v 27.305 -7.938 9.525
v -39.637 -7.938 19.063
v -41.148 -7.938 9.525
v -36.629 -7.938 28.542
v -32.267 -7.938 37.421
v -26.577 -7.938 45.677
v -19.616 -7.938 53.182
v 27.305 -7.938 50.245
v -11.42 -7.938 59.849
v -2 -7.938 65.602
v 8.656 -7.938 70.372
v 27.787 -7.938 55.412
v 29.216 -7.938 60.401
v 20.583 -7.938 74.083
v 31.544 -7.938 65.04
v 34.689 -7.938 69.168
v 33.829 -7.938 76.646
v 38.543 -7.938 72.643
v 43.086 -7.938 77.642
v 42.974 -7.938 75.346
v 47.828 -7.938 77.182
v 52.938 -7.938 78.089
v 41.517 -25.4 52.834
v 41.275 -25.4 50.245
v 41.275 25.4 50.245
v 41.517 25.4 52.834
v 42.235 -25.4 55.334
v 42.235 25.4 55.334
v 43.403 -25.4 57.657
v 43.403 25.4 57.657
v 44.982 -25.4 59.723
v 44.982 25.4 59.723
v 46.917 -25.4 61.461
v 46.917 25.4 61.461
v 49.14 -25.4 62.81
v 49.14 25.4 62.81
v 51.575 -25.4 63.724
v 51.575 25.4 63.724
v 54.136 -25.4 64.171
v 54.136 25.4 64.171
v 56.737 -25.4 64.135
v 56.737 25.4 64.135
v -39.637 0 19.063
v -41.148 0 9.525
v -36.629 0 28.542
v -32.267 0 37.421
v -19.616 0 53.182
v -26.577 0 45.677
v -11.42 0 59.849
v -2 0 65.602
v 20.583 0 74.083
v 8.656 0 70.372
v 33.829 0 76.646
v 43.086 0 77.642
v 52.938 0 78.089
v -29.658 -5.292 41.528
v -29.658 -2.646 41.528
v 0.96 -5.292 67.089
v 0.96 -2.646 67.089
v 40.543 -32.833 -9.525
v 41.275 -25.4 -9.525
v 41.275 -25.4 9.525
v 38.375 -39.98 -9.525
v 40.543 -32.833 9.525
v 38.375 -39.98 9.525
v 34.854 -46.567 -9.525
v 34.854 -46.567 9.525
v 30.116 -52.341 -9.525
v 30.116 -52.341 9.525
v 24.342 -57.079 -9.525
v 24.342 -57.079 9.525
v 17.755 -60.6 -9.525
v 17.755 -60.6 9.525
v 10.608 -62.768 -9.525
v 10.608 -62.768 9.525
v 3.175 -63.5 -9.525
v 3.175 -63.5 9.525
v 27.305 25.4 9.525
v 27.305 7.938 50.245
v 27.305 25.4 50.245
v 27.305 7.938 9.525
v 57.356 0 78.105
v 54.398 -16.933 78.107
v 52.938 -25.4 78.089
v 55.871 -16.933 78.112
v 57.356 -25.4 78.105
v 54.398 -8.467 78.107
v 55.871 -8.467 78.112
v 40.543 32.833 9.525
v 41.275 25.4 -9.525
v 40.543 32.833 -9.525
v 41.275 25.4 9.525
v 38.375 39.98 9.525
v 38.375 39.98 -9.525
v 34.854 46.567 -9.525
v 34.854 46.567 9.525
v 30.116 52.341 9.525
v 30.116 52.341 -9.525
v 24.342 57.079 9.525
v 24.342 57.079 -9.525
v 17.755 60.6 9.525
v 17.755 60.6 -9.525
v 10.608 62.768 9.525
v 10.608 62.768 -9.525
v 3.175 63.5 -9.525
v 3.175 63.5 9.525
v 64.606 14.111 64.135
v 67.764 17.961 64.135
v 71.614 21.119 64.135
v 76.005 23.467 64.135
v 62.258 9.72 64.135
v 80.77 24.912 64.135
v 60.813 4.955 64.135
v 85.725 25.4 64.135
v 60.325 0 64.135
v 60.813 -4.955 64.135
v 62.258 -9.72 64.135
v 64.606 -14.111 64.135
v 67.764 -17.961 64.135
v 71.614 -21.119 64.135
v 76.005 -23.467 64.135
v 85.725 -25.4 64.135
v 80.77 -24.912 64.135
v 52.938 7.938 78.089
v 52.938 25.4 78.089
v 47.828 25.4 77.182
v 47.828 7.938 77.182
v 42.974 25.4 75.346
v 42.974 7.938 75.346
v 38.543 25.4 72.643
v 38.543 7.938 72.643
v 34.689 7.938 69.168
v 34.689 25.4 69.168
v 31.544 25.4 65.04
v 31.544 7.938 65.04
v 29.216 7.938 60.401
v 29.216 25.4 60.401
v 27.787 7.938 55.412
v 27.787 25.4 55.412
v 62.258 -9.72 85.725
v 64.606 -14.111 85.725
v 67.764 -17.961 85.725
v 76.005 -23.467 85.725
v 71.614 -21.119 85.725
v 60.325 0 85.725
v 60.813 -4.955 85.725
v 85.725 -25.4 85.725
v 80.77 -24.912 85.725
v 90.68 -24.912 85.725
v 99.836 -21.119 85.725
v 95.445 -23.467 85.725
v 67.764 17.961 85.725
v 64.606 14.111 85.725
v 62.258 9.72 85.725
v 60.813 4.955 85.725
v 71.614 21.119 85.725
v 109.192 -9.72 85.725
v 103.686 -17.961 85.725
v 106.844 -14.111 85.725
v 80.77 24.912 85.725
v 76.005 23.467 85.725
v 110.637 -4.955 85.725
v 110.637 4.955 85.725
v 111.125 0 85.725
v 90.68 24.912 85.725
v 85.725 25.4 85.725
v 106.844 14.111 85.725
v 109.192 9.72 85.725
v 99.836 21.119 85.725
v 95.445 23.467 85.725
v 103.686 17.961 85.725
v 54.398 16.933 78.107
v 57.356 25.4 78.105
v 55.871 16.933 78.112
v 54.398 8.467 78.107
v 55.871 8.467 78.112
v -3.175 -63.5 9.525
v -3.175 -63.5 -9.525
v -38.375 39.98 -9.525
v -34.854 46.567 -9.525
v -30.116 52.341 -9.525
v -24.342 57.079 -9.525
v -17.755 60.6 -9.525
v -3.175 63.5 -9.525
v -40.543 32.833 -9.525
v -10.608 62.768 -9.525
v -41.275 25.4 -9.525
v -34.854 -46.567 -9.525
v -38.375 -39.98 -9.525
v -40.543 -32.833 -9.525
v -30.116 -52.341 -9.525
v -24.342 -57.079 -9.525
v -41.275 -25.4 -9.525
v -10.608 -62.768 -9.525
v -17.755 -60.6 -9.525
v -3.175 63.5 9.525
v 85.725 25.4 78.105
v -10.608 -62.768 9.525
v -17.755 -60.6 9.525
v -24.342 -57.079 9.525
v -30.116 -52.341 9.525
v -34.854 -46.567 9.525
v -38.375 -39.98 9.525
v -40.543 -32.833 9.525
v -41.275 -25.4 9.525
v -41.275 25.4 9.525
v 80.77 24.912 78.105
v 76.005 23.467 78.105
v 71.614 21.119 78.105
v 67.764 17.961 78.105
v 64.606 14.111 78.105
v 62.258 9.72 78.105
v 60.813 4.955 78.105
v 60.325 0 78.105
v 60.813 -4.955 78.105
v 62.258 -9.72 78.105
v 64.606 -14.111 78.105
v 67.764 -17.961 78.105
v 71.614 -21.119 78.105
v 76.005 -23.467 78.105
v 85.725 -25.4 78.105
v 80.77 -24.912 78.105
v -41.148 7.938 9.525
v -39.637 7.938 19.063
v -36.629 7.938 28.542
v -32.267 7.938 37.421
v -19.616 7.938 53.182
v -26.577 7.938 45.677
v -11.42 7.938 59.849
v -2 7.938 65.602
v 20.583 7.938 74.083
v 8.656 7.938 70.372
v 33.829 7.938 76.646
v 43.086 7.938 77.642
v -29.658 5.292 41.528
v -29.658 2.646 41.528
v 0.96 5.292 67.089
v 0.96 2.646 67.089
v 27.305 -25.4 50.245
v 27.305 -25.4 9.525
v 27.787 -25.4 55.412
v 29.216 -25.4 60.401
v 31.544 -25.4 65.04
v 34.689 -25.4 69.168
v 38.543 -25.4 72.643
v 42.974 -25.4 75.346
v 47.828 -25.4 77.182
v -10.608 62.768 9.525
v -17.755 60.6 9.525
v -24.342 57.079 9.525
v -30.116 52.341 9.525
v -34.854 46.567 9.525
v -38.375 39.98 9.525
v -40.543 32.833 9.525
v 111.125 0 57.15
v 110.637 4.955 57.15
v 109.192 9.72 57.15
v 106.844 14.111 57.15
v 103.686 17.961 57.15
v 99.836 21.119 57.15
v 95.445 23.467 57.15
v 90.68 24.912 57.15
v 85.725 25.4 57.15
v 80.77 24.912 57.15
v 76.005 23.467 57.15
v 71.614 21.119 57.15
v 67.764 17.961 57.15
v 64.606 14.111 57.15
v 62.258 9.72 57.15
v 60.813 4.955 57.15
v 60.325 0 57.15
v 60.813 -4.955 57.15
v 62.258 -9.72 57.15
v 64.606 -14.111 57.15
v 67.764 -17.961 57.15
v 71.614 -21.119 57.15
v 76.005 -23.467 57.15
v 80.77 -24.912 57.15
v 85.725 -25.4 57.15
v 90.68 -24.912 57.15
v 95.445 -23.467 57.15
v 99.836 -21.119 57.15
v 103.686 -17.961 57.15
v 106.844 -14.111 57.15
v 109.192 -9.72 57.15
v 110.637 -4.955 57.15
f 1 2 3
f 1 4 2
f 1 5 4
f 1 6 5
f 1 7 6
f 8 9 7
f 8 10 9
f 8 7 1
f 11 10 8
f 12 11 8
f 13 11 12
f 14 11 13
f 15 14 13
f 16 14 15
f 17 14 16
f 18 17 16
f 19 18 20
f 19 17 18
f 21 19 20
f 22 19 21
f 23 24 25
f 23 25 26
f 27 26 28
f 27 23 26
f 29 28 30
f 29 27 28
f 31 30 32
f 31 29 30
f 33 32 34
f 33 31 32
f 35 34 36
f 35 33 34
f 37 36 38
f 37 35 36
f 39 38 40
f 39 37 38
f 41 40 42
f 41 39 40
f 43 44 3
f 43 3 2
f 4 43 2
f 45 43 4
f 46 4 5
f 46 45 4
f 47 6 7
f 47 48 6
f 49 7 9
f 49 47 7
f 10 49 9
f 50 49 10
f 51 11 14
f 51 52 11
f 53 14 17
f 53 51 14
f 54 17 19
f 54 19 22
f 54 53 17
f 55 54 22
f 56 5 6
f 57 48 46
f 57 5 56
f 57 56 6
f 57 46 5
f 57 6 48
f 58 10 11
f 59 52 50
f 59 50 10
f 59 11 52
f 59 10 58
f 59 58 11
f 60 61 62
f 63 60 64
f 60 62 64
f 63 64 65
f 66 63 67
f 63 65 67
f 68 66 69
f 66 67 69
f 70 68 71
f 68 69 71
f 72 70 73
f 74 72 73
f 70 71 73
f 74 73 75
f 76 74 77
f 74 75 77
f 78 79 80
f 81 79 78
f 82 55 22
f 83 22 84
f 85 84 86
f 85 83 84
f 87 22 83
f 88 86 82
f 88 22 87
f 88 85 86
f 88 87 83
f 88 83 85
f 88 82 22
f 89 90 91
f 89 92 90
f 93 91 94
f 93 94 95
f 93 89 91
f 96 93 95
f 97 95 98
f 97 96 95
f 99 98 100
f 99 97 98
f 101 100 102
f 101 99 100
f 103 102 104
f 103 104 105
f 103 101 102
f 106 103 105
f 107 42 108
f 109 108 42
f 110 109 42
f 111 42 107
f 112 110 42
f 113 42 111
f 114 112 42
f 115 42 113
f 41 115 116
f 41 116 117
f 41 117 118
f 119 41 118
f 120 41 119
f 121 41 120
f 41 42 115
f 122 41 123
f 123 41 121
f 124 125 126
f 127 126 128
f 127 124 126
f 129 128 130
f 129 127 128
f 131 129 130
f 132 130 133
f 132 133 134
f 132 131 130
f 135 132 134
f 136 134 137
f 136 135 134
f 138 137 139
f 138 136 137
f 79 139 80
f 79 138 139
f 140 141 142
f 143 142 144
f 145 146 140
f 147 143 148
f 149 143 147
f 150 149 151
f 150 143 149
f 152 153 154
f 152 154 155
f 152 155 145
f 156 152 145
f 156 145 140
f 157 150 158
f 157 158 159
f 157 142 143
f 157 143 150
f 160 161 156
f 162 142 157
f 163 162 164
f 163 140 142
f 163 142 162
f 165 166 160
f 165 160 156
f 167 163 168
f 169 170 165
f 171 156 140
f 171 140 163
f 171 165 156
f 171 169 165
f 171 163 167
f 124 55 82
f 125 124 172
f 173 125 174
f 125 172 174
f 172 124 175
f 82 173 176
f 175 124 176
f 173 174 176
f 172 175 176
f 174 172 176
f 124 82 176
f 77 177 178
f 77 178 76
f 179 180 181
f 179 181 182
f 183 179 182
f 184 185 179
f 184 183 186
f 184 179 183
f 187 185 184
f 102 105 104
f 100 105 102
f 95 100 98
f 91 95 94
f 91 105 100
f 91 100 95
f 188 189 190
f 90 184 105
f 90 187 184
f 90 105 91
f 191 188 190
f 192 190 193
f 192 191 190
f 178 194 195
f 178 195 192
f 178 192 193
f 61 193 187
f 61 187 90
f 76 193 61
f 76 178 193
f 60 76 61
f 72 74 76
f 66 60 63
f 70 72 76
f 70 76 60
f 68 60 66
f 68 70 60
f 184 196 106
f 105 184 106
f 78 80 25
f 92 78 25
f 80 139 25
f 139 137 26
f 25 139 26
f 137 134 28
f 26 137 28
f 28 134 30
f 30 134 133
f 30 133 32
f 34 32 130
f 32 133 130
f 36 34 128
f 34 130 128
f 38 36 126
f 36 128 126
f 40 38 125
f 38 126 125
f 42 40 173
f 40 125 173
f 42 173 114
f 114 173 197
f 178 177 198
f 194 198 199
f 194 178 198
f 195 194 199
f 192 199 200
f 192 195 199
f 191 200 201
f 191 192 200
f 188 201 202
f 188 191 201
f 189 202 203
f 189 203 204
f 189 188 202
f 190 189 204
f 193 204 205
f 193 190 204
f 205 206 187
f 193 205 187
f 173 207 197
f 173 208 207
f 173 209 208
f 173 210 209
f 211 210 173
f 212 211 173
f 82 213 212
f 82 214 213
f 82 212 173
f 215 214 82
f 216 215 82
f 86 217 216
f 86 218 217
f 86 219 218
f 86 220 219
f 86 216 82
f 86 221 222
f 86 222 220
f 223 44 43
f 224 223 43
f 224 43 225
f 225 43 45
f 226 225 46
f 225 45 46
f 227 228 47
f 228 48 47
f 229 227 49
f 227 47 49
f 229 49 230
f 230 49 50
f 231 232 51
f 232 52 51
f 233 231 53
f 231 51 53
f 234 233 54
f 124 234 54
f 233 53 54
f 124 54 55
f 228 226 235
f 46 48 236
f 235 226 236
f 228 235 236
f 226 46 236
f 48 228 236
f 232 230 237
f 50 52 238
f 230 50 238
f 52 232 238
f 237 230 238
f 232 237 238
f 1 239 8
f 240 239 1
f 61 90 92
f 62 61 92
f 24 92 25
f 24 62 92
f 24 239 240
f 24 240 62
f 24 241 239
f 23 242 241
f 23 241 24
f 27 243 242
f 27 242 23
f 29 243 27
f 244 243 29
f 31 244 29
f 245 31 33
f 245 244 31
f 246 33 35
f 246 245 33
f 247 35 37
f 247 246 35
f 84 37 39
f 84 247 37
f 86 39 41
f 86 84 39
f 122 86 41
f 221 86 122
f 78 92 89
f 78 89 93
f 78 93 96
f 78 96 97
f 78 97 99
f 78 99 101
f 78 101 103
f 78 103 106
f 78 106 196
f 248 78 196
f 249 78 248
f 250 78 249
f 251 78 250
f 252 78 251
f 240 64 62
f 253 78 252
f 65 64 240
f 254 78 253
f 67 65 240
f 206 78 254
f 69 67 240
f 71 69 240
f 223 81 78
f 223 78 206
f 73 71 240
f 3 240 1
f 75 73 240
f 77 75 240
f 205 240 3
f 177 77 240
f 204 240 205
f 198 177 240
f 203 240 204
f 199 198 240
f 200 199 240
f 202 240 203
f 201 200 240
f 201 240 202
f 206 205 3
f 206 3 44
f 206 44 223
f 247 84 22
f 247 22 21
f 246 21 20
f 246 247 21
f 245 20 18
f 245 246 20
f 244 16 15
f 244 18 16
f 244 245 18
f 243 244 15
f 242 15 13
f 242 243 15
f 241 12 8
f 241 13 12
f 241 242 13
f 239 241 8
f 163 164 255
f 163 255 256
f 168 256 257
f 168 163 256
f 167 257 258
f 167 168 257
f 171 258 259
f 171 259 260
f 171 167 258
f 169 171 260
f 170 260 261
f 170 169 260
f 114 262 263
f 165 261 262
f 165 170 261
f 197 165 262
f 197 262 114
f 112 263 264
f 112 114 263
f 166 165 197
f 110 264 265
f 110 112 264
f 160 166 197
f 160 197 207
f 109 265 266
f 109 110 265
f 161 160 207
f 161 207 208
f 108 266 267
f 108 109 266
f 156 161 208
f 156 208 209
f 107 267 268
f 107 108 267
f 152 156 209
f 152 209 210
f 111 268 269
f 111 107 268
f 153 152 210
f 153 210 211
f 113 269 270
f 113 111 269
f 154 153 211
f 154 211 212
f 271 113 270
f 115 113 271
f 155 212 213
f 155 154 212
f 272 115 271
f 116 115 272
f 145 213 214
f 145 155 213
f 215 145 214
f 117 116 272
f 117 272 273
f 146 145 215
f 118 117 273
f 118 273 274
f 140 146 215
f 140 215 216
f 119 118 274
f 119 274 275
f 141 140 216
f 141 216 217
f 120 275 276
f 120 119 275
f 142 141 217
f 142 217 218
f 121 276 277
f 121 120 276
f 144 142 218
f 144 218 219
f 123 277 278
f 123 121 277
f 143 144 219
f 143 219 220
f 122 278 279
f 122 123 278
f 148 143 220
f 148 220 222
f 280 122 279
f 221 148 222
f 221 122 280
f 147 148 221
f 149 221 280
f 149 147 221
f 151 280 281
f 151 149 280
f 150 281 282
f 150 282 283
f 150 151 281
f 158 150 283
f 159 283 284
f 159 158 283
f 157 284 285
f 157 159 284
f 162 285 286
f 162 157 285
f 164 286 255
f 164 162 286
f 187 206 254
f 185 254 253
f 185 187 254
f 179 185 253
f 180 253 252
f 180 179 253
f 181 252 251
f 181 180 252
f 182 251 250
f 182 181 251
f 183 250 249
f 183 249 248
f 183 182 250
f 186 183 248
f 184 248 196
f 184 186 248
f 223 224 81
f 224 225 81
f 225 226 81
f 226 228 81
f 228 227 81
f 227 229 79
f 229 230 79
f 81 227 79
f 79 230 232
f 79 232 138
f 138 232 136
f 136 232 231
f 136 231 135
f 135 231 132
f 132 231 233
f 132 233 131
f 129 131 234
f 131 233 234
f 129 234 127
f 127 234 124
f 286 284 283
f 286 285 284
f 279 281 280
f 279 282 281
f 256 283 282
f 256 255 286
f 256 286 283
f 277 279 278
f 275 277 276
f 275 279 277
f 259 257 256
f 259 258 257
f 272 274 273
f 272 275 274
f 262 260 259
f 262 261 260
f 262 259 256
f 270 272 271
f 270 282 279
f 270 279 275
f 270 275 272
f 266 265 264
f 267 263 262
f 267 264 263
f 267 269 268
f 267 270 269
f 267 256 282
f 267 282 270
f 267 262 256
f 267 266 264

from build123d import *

# Parameters (mm, degrees)
F1_DEPTH = 63.5
F2_DEPTH = 25.4
F3_DEPTH = 7.9375
F5_R     = 38.1


with BuildPart() as f1:
    # F0 (on Front) → F1 (new body, symmetric)
    with BuildSketch(Plane.XZ):
        Polygon((41.275, 9.525), (27.305, 9.525), (-41.1475321427, 9.525), (-41.275, 9.525), (-41.275, -9.525), (41.275, -9.525), align=None)
    extrude(amount=F1_DEPTH, both=True)

    # F0 (on Front) → F2 (join, symmetric)
    with BuildSketch(Plane.XZ):
        with BuildLine():
            Line((27.305, 50.2448773877), (27.305, 9.525))
            Line((27.305, 9.525), (41.275, 9.525))
            Line((41.275, 9.525), (41.275, 50.2448773877))
            ThreePointArc((41.275, 50.2448773877), (45.9090266229, 60.6372063424), (56.7367753904, 64.135))
            Line((56.7367753904, 64.135), (60.325, 64.135))
            Line((60.325, 64.135), (60.325, 78.105))
            Line((60.325, 78.105), (57.3562006129, 78.105))
            add(Edge.make_bspline(
                [(52.937874551, 78.0894598439), (54.3919964318, 78.1126841505), (55.864731429, 78.1180111613), (57.3562006129, 78.105)],
                knots=[117.4190282855, 117.4190282855, 117.4190282855, 117.4190282855, 120.108518673, 120.108518673, 120.108518673, 120.108518673], degree=3))
            ThreePointArc((52.937874551, 78.0894598439), (34.6889220053, 69.1681767162), (27.305, 50.2448773877))
        make_face()
        Polygon((60.325, 78.105), (60.325, 64.135), (85.725, 64.135), (85.725, 71.4375), (85.725, 78.105), align=None)
    extrude(amount=F2_DEPTH, both=True)

    # F0 (on Front) → F3 (join, symmetric)
    with BuildSketch(Plane.XZ):
        with BuildLine():
            Line((-41.1475321427, 9.525), (27.305, 9.525))
            Line((27.305, 9.525), (27.305, 50.2448773877))
            ThreePointArc((27.305, 50.2448773877), (34.6889220053, 69.1681767162), (52.937874551, 78.0894598439))
            add(Edge.make_bspline(
                [(-41.1475321427, 9.525), (-38.4794783387, 42.0413634319), (-10.4626480253, 77.0768671657), (52.937874551, 78.0894598439)],
                knots=[0.1557518826, 0.1557518826, 0.1557518826, 0.1557518826, 117.4190282855, 117.4190282855, 117.4190282855, 117.4190282855], degree=3))
        make_face()
    extrude(amount=F3_DEPTH, both=True)

    # F0 (on Front) → F4 (revolve)
    with BuildSketch(Plane.XZ):
        Polygon((85.725, 71.4375), (85.725, 64.135), (85.725, 57.15), (111.125, 57.15), (111.125, 85.725), (85.725, 85.725), (85.725, 78.105), align=None)
    revolve(axis=Axis((85.725, 0, 71.4375), (0, 0, 1)))

    # F5
    f5_edges = [f1.edges().sort_by_distance(p)[0] for p in [
        (-41.275, -63.5, 0),
        (41.275, -63.5, 0),
        (41.275, 63.5, 0),
        (-41.275, 63.5, 0),
    ]]
    fillet(f5_edges, radius=F5_R)


solid = f1.part
